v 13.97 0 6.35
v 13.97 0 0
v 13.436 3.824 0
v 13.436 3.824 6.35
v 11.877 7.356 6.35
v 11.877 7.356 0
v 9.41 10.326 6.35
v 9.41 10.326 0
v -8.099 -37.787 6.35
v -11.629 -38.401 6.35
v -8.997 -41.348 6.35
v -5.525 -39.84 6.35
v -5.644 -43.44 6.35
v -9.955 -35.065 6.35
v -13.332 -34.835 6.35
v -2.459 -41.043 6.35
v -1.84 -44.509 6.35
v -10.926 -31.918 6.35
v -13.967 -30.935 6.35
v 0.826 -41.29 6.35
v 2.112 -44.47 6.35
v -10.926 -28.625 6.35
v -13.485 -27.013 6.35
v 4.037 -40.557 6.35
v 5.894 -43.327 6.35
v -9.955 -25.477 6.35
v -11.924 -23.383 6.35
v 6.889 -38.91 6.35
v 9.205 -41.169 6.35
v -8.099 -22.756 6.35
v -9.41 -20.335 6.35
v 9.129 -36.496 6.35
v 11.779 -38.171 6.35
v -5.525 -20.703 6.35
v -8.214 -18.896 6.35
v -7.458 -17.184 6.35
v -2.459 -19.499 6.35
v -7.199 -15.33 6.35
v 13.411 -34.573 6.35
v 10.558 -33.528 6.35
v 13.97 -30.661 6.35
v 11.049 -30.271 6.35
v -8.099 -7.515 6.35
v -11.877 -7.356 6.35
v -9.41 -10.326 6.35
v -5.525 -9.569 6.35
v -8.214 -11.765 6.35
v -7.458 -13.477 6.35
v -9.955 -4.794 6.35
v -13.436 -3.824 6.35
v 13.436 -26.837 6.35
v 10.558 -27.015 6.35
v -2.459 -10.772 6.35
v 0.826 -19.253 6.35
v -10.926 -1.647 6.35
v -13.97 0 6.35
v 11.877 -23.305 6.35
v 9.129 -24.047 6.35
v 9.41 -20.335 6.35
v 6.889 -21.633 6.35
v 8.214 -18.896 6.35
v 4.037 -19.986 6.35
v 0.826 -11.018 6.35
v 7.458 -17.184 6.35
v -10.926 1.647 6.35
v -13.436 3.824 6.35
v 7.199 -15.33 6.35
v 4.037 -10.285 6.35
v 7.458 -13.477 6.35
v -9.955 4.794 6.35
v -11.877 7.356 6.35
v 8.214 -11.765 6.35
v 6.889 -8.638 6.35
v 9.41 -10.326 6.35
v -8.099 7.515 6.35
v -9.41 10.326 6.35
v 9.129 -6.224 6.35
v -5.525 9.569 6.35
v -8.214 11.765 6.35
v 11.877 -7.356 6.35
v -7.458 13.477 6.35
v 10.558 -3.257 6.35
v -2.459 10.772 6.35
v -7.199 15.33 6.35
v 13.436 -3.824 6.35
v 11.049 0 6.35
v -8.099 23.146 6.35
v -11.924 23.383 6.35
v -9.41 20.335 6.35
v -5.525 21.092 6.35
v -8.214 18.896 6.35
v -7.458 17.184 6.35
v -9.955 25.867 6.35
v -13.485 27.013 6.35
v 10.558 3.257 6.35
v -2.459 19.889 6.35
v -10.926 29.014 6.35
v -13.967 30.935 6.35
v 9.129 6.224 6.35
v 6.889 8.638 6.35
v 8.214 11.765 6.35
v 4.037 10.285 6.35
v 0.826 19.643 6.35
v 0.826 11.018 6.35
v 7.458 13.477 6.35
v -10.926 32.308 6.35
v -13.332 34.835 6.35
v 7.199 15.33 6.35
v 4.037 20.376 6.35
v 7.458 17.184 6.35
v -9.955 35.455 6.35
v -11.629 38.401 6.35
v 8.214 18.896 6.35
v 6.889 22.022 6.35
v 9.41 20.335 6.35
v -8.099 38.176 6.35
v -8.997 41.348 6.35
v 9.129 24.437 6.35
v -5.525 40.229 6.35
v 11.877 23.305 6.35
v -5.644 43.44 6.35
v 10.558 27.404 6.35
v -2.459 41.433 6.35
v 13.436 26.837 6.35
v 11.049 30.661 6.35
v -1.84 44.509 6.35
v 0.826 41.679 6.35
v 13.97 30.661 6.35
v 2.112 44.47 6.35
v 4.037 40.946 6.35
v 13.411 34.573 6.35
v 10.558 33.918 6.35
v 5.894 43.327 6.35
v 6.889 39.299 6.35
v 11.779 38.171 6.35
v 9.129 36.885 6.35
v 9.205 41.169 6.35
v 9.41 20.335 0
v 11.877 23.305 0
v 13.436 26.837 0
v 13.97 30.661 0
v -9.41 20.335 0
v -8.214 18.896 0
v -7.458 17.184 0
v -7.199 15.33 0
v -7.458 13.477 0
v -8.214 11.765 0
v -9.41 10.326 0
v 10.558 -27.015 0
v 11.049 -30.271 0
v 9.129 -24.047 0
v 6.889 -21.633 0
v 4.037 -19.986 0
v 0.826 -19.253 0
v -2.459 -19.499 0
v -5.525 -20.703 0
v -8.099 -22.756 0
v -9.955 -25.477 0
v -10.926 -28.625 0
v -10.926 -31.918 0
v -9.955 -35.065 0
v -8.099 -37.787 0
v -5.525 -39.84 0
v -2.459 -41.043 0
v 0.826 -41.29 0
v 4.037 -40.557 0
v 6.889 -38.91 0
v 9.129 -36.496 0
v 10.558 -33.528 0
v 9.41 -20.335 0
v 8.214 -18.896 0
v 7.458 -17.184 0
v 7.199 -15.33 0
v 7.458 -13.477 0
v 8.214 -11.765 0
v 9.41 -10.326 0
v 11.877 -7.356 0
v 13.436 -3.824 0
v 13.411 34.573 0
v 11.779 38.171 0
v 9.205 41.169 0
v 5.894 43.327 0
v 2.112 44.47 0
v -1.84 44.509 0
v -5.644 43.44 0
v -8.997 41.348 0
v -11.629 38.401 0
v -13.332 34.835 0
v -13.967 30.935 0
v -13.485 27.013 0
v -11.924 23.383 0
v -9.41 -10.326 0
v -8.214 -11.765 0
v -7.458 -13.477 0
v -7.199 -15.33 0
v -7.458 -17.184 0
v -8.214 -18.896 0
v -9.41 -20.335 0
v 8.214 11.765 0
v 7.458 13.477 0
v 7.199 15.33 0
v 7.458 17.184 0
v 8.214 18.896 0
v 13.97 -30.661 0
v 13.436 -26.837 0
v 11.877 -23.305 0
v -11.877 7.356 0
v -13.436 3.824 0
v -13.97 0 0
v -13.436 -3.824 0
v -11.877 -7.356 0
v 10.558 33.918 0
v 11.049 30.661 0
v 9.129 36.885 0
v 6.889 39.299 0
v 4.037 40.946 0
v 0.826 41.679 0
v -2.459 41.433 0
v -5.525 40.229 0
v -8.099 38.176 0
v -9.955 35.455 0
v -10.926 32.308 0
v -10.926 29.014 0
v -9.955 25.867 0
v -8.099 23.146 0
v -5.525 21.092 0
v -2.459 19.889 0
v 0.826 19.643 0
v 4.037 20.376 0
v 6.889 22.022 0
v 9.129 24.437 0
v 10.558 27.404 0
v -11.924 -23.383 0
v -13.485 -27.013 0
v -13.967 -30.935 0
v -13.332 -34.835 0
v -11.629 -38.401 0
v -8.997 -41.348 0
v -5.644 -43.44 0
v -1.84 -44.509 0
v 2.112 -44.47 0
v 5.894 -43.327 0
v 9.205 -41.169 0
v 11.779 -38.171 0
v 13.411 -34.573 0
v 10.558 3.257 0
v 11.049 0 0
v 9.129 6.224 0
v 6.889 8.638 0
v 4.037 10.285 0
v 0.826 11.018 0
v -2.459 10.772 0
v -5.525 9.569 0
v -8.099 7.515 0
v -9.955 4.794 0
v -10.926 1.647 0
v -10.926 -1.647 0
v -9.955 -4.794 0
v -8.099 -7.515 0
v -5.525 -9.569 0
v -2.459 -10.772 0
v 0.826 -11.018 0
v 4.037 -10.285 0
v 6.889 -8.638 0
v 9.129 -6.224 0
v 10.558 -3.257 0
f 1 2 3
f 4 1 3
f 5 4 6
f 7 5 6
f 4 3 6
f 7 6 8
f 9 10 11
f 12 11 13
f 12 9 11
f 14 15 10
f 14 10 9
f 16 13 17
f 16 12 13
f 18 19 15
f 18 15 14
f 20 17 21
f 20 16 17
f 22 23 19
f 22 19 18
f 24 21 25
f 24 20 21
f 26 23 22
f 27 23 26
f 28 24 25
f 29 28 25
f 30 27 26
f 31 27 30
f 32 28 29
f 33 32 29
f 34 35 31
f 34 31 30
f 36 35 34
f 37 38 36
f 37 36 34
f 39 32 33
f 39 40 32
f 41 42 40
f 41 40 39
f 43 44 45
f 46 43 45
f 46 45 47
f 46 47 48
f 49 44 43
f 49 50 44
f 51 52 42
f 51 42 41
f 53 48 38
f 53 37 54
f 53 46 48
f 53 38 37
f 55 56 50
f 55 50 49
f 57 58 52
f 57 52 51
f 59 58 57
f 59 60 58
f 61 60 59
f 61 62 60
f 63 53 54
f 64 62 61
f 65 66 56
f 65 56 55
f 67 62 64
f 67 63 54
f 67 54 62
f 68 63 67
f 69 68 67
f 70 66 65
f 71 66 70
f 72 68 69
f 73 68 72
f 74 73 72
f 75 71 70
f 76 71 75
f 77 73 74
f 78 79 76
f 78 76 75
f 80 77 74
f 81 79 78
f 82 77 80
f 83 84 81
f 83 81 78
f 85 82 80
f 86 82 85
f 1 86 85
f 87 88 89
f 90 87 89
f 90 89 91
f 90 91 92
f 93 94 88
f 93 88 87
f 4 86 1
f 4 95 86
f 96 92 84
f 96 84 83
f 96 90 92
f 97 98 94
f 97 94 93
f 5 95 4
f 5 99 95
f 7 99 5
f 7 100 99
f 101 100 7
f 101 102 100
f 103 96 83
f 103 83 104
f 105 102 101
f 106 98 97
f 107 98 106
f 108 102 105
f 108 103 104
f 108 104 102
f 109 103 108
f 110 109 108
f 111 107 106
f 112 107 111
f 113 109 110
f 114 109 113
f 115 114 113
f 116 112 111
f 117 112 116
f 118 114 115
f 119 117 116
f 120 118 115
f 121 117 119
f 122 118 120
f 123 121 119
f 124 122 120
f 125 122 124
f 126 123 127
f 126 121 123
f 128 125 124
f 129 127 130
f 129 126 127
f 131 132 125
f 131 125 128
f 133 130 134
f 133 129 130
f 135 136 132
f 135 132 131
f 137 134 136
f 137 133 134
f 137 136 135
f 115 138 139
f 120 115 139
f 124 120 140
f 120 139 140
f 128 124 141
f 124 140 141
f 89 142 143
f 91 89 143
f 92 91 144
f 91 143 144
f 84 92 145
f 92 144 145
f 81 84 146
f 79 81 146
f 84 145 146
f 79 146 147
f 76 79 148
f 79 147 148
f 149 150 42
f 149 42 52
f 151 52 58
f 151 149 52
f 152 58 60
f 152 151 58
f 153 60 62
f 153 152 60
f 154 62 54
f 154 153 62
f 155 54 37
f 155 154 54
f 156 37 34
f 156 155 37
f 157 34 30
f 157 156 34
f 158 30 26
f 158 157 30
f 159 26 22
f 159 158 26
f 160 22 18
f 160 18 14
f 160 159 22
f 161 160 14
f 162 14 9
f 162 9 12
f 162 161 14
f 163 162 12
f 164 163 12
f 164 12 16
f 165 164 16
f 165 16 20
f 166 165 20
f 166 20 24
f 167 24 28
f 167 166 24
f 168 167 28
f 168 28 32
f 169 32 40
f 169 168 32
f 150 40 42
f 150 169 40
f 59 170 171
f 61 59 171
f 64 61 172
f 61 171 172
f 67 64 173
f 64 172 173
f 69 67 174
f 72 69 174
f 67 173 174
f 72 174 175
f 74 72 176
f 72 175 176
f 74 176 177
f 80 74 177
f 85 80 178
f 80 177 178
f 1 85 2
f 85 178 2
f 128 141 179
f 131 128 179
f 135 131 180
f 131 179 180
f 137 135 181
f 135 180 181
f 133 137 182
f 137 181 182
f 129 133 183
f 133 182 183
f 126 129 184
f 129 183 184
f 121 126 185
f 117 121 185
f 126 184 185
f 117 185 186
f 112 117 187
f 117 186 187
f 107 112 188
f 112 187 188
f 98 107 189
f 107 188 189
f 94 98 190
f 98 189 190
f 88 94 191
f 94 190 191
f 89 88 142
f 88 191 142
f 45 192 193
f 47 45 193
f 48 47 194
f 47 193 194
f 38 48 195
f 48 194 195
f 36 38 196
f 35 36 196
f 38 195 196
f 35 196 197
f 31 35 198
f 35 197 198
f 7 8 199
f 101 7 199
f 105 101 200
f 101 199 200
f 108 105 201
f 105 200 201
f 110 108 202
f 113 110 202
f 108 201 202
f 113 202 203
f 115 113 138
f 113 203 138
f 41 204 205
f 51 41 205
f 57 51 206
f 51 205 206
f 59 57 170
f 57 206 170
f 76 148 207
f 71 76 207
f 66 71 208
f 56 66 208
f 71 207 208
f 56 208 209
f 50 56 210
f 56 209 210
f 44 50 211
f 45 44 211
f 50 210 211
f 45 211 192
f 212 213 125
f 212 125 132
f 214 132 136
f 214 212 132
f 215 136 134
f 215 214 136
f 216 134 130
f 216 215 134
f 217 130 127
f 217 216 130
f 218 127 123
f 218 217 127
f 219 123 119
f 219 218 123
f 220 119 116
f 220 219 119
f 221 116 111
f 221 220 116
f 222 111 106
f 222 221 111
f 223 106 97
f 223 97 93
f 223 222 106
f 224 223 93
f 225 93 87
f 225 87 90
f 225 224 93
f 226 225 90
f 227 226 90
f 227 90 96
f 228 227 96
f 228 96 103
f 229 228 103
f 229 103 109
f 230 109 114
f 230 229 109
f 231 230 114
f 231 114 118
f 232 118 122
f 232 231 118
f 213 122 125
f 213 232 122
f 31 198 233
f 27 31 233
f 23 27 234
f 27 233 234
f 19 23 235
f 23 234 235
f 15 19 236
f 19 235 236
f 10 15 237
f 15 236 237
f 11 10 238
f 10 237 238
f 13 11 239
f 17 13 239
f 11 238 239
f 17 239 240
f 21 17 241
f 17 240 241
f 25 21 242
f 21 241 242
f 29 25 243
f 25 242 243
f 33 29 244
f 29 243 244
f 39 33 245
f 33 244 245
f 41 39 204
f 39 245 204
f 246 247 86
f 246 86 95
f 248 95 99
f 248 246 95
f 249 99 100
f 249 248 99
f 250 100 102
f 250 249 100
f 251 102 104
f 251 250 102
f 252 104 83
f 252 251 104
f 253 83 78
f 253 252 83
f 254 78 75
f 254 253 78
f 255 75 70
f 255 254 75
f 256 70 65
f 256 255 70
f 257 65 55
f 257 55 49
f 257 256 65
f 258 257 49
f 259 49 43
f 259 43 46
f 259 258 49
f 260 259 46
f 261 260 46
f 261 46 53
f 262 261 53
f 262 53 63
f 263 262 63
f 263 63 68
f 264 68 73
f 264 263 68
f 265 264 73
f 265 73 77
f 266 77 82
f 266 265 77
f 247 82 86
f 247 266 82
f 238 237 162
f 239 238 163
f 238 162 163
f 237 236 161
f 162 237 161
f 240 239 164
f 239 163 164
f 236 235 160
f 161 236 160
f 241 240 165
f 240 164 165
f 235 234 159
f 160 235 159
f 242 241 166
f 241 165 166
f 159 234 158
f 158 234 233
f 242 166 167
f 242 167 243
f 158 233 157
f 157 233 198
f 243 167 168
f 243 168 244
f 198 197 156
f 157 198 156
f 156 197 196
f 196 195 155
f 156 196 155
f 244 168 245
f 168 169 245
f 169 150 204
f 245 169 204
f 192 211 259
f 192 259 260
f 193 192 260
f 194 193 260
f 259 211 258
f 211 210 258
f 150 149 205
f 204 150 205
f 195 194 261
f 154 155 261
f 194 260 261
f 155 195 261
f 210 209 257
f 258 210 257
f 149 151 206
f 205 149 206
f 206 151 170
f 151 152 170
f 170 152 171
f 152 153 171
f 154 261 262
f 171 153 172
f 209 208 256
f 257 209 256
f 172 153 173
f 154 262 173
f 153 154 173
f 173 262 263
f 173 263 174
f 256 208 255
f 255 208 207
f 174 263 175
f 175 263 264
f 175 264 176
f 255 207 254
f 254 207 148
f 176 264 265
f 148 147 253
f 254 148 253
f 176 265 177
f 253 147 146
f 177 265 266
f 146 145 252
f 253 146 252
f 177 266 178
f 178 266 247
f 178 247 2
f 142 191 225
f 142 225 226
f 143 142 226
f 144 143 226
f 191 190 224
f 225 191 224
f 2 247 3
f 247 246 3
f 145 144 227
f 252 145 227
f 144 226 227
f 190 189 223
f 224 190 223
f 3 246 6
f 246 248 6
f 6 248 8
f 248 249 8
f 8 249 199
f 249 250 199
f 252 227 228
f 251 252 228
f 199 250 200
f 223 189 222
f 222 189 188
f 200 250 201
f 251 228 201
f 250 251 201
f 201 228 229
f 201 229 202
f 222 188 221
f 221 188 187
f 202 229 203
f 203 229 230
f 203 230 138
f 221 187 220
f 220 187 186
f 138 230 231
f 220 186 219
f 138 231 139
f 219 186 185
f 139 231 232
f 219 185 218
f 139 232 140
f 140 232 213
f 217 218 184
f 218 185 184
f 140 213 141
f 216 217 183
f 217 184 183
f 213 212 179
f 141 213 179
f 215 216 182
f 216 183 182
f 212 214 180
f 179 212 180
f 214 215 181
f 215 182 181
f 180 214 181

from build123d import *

# Parameters (mm, degrees)
F4_R     = 11.049
F5_DEPTH = 6.35


with BuildPart() as f5:
    # F4 (on Top) → F5 (new body)
    with BuildSketch(Plane.XY):
        with BuildLine():
            ThreePointArc((9.409508, 20.334971), (12.779118, 25.01674), (13.97, 30.660767))
            ThreePointArc((13.97, 30.660767), (-5.644027, 43.439885), (-9.409508, 20.334971))
            ThreePointArc((-9.409508, 20.334971), (0, 16.690767), (9.409508, 20.334971))
        make_face()
        with Locations((0, 30.660767)):
            Circle(F4_R, mode=Mode.SUBTRACT)
        with BuildLine():
            ThreePointArc((9.409508, 20.334971), (0, 16.690767), (-9.409508, 20.334971))
            ThreePointArc((-9.409508, 20.334971), (-7.199181, 15.330384), (-9.409508, 10.325796))
            ThreePointArc((-9.409508, 10.325796), (0, 13.97), (9.409508, 10.325796))
            ThreePointArc((9.409508, 10.325796), (7.199181, 15.330384), (9.409508, 20.334971))
        make_face()
        Circle(F4_R)
        with BuildLine():
            ThreePointArc((9.409508, 10.325796), (0, 13.97), (-9.409508, 10.325796))
            ThreePointArc((-9.409508, 10.325796), (-13.97, 0), (-9.409508, -10.325796))
            ThreePointArc((-9.409508, -10.325796), (0, -13.97), (9.409508, -10.325796))
            ThreePointArc((9.409508, -10.325796), (12.779118, -5.644027), (13.97, 0))
            ThreePointArc((13.97, 0), (12.779118, 5.644027), (9.409508, 10.325796))
        make_face()
        Circle(F4_R, mode=Mode.SUBTRACT)
        with BuildLine():
            ThreePointArc((9.409508, -10.325796), (0, -13.97), (-9.409508, -10.325796))
            ThreePointArc((-9.409508, -10.325796), (-7.199181, -15.330384), (-9.409508, -20.334971))
            ThreePointArc((-9.409508, -20.334971), (0, -16.690767), (9.409508, -20.334971))
            ThreePointArc((9.409508, -20.334971), (7.199181, -15.330384), (9.409508, -10.325796))
        make_face()
        with BuildLine():
            ThreePointArc((9.409508, -20.334971), (0, -16.690767), (-9.409508, -20.334971))
            ThreePointArc((-9.409508, -20.334971), (-5.644027, -43.439885), (13.97, -30.660767))
            ThreePointArc((13.97, -30.660767), (12.779118, -25.01674), (9.409508, -20.334971))
        make_face()
        with Locations((0, -30.271422)):
            Circle(F4_R, mode=Mode.SUBTRACT)
    extrude(amount=F5_DEPTH)


solid = f5.part
